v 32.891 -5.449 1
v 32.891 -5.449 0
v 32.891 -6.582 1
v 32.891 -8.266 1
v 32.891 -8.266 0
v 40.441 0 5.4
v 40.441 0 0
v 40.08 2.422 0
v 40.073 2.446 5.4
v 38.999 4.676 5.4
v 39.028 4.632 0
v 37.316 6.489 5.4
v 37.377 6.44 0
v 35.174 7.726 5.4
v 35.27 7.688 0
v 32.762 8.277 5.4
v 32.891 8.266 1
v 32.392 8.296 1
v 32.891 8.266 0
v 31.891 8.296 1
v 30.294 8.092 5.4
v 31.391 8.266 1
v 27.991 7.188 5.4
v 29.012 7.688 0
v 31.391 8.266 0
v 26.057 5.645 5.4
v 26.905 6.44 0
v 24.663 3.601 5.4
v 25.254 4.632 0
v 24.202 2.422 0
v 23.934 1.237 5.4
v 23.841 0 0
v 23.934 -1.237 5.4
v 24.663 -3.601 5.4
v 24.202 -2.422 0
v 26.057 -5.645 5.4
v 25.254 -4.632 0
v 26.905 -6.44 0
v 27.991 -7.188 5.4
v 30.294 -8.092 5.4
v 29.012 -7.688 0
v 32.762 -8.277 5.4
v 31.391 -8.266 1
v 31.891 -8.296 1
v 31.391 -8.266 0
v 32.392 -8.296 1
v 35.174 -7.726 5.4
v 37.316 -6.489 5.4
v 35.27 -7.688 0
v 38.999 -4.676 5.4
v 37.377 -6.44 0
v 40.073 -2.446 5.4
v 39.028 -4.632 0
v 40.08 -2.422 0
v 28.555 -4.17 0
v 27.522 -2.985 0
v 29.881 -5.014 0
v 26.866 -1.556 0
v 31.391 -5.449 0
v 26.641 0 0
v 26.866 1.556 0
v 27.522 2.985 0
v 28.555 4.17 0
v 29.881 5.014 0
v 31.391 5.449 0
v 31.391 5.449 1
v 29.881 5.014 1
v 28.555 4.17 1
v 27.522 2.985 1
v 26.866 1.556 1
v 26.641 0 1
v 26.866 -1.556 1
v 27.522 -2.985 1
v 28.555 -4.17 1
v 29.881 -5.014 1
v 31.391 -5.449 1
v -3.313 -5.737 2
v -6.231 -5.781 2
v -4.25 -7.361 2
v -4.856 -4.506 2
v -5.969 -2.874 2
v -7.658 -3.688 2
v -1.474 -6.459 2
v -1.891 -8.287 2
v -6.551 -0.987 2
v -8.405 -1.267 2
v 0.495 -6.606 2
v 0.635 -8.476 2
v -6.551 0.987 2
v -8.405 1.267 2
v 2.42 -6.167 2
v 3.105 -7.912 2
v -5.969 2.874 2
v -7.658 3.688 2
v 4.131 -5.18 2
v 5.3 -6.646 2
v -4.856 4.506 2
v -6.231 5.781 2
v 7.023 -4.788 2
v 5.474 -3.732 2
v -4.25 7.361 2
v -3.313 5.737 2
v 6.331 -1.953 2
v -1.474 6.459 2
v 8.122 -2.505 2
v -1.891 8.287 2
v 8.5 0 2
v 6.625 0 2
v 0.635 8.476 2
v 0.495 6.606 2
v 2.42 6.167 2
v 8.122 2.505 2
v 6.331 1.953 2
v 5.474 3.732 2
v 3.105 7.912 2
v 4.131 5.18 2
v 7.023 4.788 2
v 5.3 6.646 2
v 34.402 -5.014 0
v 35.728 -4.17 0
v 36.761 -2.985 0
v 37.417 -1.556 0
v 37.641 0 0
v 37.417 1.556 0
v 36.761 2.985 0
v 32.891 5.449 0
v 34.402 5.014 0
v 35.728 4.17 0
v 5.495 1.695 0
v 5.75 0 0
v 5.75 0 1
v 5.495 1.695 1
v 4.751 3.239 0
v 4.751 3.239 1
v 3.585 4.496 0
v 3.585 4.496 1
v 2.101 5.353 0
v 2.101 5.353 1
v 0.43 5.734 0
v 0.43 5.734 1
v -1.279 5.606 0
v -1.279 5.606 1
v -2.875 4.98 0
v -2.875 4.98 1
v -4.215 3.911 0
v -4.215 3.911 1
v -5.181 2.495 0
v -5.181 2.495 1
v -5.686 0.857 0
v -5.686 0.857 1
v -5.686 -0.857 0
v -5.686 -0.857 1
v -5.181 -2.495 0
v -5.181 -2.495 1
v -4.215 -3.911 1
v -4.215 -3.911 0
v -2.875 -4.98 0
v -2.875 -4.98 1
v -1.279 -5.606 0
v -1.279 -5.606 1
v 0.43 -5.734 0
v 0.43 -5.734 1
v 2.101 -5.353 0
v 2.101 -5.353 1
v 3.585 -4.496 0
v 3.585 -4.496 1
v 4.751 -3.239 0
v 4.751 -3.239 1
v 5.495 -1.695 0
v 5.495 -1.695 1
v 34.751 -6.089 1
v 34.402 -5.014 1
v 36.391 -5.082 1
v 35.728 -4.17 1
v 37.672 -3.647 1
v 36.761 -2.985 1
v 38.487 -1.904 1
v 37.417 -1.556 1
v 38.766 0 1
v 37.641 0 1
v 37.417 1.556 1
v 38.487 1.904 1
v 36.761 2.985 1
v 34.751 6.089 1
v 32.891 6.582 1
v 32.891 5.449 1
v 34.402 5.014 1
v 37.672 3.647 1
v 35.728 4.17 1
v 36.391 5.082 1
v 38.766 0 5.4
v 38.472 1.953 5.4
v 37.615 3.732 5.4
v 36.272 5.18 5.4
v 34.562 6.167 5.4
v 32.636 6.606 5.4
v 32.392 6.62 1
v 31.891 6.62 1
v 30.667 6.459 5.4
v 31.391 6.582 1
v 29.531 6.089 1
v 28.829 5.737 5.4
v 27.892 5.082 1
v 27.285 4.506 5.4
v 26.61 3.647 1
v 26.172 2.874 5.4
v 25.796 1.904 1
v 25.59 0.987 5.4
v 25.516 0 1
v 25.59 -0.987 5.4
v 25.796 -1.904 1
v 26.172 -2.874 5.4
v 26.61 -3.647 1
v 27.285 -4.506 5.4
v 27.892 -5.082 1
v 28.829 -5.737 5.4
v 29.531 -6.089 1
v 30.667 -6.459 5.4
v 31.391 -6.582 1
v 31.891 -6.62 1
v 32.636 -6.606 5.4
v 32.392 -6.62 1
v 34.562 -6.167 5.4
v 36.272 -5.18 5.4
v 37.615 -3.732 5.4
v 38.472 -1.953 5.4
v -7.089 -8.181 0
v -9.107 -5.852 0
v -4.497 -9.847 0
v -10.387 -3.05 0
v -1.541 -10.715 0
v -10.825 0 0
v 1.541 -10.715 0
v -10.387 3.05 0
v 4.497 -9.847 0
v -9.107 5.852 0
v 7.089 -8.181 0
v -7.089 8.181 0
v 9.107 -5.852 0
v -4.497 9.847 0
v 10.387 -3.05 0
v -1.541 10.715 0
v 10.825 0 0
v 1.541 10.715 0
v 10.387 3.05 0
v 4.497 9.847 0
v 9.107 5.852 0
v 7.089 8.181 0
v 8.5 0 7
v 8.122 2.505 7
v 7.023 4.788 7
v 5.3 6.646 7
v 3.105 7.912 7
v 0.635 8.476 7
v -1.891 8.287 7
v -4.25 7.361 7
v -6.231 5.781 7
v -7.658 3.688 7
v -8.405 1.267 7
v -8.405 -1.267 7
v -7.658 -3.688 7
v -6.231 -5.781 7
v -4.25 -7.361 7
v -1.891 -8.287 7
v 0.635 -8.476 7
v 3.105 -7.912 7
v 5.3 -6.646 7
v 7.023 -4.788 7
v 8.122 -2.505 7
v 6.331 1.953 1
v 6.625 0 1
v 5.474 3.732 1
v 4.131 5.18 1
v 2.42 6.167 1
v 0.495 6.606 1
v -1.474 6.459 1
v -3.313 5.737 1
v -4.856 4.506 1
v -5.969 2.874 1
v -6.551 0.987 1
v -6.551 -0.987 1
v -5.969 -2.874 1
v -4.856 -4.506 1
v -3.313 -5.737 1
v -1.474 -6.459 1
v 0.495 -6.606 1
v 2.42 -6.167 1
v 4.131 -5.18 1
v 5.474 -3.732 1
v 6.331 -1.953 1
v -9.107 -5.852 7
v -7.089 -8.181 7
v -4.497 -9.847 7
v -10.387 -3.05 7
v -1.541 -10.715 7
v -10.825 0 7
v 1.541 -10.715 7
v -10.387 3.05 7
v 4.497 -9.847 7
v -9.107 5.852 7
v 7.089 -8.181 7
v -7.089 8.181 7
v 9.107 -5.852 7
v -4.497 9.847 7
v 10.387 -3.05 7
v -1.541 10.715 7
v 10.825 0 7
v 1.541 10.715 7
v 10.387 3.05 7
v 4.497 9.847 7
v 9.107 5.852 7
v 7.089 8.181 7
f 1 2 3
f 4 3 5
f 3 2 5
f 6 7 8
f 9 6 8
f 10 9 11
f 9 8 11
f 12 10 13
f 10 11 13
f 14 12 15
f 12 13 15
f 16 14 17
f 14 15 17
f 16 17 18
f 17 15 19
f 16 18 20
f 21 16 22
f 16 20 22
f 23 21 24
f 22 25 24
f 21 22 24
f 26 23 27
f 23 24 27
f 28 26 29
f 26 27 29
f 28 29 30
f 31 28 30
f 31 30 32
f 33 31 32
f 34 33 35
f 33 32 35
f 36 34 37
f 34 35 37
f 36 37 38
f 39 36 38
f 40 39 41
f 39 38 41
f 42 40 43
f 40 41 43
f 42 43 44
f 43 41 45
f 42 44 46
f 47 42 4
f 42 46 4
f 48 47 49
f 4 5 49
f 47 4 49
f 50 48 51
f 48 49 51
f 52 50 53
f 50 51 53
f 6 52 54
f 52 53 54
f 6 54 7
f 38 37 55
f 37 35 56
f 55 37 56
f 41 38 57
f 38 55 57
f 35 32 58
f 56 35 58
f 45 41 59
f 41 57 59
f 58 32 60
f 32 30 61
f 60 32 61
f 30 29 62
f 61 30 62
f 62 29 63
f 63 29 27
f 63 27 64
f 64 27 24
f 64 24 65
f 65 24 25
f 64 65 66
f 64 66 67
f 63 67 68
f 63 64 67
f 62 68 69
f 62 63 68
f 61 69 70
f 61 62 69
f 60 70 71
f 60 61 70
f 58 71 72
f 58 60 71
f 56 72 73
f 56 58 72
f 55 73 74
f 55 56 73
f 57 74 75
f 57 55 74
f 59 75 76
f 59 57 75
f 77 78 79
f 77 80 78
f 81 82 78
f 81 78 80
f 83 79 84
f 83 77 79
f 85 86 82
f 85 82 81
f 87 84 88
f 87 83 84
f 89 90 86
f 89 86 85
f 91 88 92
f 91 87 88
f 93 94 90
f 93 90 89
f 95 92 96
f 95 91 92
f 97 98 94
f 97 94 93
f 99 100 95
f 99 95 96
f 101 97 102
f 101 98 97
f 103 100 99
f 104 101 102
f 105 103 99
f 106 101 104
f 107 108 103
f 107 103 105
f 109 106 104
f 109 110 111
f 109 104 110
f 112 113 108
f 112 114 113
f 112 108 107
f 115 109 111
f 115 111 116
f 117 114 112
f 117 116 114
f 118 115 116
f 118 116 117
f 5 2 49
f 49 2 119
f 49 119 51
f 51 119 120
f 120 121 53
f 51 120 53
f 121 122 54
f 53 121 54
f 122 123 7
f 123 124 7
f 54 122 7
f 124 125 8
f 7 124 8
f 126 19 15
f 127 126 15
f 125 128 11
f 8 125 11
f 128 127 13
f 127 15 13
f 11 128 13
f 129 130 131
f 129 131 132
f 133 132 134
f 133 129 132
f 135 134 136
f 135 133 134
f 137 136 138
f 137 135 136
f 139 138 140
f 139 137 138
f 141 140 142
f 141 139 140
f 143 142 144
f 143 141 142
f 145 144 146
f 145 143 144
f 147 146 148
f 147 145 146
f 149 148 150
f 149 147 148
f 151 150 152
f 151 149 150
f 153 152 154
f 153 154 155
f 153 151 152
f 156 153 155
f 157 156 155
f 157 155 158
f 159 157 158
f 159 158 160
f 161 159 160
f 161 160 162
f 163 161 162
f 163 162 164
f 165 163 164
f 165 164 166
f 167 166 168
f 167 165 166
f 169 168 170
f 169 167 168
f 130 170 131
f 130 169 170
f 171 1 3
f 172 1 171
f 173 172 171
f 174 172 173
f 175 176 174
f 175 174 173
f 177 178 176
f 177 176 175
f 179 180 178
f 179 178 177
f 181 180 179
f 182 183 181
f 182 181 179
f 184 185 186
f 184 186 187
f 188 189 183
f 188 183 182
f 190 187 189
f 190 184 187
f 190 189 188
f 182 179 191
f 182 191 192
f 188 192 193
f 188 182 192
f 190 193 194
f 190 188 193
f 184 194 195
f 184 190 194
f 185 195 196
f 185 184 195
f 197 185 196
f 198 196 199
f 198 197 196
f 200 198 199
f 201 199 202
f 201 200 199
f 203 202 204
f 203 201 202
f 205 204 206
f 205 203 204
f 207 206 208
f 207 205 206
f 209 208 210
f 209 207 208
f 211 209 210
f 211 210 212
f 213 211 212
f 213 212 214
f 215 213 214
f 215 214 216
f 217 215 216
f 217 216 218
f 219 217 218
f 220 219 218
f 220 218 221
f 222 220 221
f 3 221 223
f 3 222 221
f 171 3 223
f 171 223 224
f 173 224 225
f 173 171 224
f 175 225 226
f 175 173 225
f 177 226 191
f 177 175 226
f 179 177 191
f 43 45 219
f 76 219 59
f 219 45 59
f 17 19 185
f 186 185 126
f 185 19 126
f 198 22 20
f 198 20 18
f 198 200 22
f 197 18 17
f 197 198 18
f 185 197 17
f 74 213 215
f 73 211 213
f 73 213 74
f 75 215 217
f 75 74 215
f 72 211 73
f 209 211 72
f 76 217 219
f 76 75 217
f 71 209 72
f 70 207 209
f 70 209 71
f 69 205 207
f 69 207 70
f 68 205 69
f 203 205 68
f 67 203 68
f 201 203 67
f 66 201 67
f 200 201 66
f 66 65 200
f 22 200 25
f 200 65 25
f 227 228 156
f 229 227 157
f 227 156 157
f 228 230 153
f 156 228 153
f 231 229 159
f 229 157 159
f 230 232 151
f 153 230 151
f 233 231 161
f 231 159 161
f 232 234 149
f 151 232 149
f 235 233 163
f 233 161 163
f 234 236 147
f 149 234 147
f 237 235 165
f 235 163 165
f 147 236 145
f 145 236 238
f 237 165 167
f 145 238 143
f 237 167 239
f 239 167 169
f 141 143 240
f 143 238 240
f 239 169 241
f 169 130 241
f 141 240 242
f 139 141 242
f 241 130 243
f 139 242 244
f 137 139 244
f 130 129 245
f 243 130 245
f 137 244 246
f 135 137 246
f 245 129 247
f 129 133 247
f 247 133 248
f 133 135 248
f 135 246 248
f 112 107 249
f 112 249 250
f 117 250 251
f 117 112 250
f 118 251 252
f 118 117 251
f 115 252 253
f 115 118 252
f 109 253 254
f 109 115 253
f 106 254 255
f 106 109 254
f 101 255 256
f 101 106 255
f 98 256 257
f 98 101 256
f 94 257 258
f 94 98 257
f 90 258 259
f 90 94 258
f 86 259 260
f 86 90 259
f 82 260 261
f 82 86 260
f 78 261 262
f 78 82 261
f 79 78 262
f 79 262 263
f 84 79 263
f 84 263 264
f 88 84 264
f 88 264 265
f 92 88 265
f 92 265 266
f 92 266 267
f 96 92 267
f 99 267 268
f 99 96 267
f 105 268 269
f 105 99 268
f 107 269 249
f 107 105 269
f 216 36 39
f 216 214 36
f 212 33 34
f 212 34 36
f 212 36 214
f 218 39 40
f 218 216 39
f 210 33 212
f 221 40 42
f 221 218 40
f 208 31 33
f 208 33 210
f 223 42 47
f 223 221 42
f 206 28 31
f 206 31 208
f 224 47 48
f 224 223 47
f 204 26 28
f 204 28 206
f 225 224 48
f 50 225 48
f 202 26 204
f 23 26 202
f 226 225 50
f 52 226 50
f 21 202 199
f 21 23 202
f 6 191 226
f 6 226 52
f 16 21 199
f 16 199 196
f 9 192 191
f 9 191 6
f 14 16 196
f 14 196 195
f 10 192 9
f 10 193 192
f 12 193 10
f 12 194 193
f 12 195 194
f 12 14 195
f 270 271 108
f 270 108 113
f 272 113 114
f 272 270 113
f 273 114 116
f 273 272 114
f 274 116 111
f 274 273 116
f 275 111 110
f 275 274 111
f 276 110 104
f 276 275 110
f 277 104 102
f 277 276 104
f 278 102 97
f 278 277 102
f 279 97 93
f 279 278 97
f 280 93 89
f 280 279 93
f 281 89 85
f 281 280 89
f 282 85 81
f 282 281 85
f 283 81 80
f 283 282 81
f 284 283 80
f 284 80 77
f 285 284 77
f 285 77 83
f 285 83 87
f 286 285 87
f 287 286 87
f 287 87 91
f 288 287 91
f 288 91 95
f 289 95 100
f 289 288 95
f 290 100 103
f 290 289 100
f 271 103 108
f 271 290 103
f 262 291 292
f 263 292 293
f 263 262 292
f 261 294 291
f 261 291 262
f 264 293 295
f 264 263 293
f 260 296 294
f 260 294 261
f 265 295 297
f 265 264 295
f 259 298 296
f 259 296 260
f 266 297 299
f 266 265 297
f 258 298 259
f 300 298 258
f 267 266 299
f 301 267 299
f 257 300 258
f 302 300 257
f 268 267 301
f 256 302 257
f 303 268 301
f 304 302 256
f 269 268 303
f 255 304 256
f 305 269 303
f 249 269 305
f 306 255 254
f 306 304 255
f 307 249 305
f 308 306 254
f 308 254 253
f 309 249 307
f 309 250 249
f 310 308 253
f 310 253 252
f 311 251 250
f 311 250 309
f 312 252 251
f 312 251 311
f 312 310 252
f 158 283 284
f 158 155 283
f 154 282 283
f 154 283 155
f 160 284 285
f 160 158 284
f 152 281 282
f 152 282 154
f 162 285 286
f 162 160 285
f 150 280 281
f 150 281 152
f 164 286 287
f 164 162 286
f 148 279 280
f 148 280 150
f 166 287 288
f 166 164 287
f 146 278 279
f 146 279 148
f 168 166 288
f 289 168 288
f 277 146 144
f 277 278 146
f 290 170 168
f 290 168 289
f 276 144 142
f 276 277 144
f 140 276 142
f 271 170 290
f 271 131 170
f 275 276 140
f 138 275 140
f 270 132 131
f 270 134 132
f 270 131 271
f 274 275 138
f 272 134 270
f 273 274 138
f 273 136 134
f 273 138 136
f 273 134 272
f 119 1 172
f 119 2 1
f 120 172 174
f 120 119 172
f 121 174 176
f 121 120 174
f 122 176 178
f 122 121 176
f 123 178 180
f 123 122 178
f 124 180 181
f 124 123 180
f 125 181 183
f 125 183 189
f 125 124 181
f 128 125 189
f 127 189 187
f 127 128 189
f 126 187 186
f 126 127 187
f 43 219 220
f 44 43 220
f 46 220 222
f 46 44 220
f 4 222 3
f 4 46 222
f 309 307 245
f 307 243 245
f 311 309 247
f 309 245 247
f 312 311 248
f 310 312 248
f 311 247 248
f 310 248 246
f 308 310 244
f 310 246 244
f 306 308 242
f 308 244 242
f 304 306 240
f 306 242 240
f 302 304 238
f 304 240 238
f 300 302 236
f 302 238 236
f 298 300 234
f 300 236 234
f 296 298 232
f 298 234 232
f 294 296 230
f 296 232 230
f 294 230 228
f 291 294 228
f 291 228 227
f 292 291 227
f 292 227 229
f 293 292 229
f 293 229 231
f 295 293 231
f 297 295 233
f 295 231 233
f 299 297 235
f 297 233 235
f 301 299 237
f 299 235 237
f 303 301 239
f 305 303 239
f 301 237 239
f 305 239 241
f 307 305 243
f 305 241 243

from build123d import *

# Parameters (mm, degrees)
F0_R      = 10.825
F0_R_2    = 5.75
F1_DEPTH  = 1
F2_R      = 10.825
F2_R_2    = 6.625
F3_DEPTH  = 1
F4_R      = 10.825
F4_R_2    = 8.5
F5_DEPTH  = 5
F6_R      = 8.3
F6_R_2    = 5.5
F7_DEPTH  = 1
F8_R      = 8.3
F8_R_2    = 6.625
F9_DEPTH  = 4.4
F11_DEPTH = 1


with BuildPart() as f1:
    # F0 (on Top) → F1 (new body)
    with BuildSketch(Plane.XY):
        Circle(F0_R)
        Circle(F0_R_2, mode=Mode.SUBTRACT)
    extrude(amount=F1_DEPTH)

    # F2 (on face) → F3 (join)
    with BuildSketch(Plane.XY.offset(1)):
        Circle(F2_R)
        Circle(F2_R_2, mode=Mode.SUBTRACT)
    extrude(amount=F3_DEPTH)

    # F4 (on face) → F5 (join)
    with BuildSketch(Plane.XY.offset(2)):
        Circle(F4_R)
        Circle(F4_R_2, mode=Mode.SUBTRACT)
    extrude(amount=F5_DEPTH)


with BuildPart() as f7:
    # F6 (on Top) → F7 (new body)
    with BuildSketch(Plane.XY):
        with Locations((32.1412831545, 0)):
            Circle(F6_R)
        with Locations((32.1412831545, 0)):
            Circle(F6_R_2, mode=Mode.SUBTRACT)
    extrude(amount=F7_DEPTH)

    # F8 (on face) → F9 (join)
    with BuildSketch(Plane.XY.offset(1)):
        with Locations((32.1412831545, 0)):
            Circle(F8_R)
        with Locations((32.1412831545, 0)):
            Circle(F8_R_2, mode=Mode.SUBTRACT)
    extrude(amount=F9_DEPTH)

    # F10 (on face) → F11 (cut)
    with BuildSketch(Plane(origin=(0, 0, 0), x_dir=(1, 0, 0), z_dir=(0, 0, -1))):
        with BuildLine():
            ThreePointArc((31.3912831545, 5.4486236794), (32.1412831545, 5.5), (32.8912831545, 5.4486236794))
            Line((32.8912831545, 5.4486236794), (32.8912831545, 8.2660450035))
            ThreePointArc((32.8912831545, 8.2660450035), (32.1412831545, 8.3), (31.3912831545, 8.2660450035))
            Line((31.3912831545, 8.2660450035), (31.3912831545, 5.4486236794))
        make_face()
        with BuildLine():
            Line((32.8912831545, -8.2660450035), (32.8912831545, -5.4486236794))
            ThreePointArc((32.8912831545, -5.4486236794), (32.1412831545, -5.5), (31.3912831545, -5.4486236794))
            Line((31.3912831545, -5.4486236794), (31.3912831545, -8.2660450035))
            ThreePointArc((31.3912831545, -8.2660450035), (32.1412831545, -8.3), (32.8912831545, -8.2660450035))
        make_face()
    extrude(amount=-F11_DEPTH, mode=Mode.SUBTRACT)


solid = Compound([f1.part, f7.part])
